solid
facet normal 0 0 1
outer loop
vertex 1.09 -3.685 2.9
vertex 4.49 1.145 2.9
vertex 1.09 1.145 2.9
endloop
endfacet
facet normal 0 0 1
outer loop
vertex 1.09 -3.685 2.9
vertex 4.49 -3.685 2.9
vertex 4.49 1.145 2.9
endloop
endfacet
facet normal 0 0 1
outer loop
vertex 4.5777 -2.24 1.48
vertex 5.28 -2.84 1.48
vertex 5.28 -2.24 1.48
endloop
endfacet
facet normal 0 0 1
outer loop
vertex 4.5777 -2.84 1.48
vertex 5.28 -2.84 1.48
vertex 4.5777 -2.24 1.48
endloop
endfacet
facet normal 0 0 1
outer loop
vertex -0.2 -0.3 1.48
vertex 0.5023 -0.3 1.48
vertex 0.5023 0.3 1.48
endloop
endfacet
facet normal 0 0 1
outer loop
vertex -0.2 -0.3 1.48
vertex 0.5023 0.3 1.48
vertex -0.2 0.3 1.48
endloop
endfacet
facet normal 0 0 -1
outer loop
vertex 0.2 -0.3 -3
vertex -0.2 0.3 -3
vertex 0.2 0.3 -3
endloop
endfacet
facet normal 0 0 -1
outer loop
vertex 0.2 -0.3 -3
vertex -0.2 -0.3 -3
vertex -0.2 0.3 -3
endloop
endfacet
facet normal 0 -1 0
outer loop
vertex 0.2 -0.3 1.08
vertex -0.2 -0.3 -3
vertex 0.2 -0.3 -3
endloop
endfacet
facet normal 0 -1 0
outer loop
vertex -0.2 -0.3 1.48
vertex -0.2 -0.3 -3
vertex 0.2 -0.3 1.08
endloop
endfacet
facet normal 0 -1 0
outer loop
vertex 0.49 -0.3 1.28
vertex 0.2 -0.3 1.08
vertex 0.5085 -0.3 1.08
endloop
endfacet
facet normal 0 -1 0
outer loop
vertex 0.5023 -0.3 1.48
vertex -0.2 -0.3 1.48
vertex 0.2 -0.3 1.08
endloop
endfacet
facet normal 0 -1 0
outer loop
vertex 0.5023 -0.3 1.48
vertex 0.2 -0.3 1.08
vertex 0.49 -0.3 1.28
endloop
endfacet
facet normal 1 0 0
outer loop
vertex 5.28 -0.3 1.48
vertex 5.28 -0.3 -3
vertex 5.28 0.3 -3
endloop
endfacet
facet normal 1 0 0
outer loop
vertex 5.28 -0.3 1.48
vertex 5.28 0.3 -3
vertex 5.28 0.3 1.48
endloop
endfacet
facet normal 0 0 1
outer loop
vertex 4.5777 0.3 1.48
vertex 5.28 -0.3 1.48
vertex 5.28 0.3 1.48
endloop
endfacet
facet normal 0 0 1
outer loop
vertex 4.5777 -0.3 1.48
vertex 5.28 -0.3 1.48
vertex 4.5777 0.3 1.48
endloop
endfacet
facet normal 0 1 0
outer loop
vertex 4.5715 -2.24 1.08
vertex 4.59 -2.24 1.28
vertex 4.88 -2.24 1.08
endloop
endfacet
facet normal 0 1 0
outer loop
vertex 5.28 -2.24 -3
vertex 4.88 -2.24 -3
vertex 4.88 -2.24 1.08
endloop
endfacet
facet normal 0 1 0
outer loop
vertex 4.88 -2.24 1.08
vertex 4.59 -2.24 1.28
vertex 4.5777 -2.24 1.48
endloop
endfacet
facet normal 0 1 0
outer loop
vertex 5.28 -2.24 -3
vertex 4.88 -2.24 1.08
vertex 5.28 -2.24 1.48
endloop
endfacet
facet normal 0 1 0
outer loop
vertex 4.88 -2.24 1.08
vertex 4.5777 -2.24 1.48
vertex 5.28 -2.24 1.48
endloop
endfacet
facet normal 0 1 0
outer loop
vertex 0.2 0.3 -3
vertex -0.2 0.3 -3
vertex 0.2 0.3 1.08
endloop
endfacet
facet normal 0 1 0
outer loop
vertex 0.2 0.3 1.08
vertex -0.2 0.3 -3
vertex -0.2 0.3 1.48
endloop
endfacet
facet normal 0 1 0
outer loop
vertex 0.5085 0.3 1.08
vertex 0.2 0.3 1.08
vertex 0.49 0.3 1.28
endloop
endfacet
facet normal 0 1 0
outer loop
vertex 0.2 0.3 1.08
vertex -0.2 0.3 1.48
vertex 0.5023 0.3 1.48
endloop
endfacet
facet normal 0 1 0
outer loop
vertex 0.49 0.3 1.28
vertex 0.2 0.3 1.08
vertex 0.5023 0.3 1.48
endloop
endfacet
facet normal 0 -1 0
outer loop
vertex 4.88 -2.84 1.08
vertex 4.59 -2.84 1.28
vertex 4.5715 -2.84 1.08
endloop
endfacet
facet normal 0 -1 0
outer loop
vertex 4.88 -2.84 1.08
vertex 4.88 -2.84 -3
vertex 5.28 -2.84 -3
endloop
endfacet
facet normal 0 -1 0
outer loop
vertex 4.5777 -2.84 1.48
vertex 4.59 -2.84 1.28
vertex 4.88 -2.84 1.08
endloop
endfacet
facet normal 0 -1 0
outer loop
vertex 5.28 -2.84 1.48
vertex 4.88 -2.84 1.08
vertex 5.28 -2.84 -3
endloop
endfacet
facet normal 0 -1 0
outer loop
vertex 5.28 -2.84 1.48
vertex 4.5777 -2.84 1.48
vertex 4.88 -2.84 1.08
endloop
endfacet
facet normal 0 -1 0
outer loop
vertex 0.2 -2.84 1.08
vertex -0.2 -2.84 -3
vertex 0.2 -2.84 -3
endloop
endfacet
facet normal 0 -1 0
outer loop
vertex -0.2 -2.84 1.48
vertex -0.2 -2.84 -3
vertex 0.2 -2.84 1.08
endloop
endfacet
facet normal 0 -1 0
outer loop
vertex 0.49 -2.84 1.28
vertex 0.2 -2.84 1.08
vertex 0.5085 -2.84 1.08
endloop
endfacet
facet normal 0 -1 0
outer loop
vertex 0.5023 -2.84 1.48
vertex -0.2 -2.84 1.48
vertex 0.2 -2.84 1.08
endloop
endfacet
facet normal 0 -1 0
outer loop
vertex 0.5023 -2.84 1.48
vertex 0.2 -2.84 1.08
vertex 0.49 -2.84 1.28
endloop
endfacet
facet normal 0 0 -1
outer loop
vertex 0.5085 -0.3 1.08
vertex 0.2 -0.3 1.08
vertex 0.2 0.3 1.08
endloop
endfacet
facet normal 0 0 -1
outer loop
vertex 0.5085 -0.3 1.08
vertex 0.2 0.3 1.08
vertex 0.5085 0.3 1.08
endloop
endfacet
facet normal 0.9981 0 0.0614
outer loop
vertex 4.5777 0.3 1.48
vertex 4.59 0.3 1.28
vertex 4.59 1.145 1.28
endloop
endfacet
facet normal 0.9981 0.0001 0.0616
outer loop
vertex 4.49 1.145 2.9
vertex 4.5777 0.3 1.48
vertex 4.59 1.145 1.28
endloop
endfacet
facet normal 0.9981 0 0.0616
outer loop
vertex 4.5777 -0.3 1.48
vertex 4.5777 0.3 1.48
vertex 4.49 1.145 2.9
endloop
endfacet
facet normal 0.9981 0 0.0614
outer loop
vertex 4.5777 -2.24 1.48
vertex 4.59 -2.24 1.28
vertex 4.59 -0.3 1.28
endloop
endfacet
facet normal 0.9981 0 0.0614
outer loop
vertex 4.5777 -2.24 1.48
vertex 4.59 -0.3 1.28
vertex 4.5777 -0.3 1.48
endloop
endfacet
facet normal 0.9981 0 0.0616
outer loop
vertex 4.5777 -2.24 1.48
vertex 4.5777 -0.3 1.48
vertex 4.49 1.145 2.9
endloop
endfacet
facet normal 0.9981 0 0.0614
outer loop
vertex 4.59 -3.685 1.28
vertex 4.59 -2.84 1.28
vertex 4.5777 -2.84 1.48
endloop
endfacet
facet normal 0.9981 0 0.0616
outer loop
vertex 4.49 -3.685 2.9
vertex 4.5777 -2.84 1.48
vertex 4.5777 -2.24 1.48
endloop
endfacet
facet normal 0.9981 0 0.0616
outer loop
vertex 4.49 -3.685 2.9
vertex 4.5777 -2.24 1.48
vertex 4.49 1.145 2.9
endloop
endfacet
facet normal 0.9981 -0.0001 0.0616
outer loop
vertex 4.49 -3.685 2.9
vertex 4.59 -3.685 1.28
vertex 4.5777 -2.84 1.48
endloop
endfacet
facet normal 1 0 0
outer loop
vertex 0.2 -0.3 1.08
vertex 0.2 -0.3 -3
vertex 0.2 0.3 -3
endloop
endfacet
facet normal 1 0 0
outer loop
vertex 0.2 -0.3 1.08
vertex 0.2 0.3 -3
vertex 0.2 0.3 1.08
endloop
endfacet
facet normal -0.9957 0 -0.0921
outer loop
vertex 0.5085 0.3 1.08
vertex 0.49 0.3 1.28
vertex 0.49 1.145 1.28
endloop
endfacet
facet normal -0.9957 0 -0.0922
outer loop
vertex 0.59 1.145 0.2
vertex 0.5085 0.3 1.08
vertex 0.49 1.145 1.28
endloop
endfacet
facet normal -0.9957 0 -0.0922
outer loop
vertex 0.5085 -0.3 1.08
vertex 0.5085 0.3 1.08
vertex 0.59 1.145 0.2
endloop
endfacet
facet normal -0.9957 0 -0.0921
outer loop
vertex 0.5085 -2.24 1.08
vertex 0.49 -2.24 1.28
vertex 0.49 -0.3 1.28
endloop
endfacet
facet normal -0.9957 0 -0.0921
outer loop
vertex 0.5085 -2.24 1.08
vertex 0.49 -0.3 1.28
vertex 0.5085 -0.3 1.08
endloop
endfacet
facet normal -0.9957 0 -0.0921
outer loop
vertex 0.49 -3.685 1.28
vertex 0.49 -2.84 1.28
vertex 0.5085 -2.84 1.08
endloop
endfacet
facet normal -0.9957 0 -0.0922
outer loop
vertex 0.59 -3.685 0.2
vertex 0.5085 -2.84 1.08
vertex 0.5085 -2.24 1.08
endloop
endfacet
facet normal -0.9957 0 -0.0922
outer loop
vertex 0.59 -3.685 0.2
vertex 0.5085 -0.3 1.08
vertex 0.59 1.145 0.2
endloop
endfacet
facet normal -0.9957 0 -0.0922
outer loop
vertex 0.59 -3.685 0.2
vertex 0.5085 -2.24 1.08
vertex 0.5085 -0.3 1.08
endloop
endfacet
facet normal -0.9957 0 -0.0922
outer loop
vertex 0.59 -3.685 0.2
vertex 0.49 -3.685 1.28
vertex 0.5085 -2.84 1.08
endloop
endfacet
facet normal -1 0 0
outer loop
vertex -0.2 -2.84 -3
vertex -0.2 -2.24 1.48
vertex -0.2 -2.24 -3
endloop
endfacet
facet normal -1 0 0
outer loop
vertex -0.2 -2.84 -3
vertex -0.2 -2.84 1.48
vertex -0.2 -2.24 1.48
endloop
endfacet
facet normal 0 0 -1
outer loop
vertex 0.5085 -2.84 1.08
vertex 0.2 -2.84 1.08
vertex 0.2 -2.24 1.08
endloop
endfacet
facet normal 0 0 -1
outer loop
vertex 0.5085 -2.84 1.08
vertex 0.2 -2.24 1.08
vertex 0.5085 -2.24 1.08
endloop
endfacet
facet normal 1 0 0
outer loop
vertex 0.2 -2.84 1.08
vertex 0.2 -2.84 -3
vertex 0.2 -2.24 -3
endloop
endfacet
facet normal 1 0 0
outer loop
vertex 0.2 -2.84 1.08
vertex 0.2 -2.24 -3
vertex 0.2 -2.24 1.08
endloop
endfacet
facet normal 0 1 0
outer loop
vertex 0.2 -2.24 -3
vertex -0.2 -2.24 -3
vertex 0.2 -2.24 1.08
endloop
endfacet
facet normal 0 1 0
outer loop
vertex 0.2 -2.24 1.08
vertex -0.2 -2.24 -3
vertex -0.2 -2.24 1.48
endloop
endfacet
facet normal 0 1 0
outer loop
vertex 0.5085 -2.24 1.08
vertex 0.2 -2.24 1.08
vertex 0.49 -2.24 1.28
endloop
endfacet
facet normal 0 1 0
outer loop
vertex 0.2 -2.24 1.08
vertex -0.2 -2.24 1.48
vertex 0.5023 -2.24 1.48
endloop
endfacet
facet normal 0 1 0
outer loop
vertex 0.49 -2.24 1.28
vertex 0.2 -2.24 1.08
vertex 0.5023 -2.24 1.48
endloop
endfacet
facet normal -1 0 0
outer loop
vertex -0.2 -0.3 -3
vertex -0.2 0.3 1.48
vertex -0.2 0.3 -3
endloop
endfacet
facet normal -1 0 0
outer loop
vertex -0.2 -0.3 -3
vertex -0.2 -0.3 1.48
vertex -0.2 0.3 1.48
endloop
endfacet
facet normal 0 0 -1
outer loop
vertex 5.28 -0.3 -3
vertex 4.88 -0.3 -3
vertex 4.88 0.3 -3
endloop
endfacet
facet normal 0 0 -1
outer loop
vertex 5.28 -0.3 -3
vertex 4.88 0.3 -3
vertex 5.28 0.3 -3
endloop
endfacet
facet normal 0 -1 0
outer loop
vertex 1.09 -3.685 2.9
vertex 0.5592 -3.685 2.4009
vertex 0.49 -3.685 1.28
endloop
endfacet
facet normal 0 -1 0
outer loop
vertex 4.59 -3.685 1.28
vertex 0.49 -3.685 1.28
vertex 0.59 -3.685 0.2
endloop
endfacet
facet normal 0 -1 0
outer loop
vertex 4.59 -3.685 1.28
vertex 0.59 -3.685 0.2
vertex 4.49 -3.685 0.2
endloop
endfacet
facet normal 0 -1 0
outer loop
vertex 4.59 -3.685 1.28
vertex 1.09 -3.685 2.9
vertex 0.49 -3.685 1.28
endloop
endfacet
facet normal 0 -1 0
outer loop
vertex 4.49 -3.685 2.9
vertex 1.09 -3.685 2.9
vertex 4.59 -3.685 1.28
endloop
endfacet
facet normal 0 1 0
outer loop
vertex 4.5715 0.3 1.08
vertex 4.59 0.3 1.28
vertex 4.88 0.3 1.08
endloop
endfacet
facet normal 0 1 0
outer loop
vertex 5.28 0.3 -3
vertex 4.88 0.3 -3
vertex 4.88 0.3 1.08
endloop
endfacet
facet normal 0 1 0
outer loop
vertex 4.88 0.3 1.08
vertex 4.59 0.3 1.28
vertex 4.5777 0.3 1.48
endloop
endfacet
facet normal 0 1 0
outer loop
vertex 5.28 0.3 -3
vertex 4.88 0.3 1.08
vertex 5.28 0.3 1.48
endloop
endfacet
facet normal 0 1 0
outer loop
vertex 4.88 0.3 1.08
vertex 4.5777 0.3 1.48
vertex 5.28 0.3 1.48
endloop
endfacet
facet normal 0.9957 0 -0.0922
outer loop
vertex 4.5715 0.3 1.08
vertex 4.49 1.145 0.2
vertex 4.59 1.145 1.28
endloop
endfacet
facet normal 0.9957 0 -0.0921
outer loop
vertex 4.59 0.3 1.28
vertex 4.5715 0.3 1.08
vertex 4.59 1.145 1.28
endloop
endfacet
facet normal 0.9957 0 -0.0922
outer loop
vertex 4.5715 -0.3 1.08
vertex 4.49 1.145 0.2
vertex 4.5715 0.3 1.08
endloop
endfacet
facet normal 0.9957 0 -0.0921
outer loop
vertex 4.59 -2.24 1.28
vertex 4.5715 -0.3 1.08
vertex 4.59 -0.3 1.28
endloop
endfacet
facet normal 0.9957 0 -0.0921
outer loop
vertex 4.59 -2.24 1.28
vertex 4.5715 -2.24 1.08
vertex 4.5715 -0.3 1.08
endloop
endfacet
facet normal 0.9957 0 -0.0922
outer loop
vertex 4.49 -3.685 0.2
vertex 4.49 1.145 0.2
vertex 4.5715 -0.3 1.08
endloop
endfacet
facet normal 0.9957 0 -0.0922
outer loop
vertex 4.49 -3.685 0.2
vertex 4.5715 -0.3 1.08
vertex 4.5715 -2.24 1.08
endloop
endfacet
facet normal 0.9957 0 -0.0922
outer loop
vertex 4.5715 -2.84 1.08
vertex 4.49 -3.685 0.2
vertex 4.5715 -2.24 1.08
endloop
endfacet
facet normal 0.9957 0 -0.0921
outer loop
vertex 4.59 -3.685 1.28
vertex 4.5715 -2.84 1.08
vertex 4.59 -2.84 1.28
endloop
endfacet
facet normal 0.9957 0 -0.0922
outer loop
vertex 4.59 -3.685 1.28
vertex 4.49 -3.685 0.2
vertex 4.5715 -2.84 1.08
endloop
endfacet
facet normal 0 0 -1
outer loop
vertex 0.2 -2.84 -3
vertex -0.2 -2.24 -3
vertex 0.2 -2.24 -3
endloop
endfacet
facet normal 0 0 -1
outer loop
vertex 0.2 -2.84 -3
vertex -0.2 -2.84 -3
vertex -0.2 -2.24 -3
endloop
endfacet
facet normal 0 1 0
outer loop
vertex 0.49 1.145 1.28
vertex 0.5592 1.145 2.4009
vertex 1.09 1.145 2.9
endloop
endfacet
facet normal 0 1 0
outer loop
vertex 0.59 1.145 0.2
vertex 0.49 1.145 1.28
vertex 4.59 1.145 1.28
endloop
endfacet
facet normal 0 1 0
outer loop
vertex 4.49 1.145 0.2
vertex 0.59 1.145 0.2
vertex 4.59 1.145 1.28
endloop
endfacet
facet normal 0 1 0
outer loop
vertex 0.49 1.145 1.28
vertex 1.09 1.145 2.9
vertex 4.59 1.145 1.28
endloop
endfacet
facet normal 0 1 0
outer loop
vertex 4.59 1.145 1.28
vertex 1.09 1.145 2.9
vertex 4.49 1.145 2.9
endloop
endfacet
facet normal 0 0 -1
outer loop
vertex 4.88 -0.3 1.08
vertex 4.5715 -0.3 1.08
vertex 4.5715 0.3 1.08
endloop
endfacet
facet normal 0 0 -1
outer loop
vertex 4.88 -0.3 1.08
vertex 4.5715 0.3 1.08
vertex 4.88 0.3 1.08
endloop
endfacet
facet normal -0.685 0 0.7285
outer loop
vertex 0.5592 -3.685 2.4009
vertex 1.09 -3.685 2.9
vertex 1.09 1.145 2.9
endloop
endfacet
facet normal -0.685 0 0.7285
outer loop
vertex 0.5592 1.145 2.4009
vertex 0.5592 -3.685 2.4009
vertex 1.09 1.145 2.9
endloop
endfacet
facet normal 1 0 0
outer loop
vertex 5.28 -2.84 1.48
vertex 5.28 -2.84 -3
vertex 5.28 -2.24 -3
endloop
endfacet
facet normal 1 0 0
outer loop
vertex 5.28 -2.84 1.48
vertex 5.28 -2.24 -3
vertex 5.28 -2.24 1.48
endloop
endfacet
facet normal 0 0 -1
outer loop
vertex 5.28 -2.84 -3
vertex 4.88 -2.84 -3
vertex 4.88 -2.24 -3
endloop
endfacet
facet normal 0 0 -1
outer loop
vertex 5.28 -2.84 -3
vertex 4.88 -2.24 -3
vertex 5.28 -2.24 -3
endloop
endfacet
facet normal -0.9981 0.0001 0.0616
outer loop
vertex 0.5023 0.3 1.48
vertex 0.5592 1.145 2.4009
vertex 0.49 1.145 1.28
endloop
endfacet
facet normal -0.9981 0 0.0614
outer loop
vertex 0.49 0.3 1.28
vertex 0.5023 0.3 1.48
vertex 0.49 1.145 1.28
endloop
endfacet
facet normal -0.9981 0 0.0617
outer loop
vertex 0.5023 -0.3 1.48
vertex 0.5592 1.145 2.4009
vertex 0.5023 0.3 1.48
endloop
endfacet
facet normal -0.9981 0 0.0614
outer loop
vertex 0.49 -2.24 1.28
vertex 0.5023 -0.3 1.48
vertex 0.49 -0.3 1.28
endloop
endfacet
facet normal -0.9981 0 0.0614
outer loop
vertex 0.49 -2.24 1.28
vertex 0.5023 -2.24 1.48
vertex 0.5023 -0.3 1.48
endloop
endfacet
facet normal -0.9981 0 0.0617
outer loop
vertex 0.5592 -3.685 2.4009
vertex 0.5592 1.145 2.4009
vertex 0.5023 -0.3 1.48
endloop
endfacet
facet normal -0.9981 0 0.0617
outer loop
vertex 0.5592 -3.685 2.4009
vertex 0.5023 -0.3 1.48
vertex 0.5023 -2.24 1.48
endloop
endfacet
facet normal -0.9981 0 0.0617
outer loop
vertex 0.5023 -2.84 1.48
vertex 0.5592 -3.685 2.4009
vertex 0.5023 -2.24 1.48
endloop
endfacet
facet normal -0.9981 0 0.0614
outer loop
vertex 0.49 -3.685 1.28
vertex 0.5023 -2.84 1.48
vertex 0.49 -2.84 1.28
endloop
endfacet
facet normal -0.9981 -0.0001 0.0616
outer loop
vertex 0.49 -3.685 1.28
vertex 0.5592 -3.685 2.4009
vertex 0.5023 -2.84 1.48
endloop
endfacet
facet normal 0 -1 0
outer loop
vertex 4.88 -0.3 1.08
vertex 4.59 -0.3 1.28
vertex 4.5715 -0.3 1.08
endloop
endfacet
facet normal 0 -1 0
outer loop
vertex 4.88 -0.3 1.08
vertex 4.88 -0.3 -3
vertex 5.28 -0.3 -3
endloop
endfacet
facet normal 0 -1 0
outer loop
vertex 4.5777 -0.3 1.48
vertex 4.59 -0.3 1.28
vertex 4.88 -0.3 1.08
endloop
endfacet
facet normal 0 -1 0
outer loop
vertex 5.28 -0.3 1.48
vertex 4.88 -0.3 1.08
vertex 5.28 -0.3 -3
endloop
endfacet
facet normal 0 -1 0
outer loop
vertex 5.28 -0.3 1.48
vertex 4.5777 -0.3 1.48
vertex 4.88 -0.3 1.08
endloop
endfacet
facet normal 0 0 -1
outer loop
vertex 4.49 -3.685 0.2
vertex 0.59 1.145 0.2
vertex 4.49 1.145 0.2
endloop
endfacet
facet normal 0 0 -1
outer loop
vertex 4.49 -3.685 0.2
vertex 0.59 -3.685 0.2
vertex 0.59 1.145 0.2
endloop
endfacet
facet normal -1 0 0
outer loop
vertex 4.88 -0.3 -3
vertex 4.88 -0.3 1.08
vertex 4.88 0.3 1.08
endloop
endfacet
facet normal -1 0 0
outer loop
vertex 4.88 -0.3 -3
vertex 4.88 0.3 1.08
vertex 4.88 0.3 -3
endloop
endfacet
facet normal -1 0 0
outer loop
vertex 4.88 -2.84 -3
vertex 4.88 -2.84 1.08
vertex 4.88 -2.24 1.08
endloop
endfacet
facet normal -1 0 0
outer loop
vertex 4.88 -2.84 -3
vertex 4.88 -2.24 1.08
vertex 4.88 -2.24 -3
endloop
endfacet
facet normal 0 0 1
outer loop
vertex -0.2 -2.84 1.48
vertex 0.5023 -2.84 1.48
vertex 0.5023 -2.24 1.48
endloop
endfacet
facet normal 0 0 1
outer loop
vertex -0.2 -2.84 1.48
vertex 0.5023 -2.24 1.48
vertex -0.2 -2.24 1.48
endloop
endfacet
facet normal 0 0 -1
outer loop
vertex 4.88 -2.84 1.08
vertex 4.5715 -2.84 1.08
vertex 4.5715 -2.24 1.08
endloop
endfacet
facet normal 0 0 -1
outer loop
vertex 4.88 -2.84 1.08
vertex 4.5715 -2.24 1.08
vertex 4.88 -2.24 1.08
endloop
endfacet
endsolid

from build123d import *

# Parameters (mm, degrees)
PAD002_DEPTH = 0.3
PAD_DEPTH    = 2.415
CHAMFER_SIZE = 0.5
PAD001_DEPTH = 0.3


with BuildPart() as pad002:
    # Sketch002 → Pad002 (new body, symmetric)
    with BuildSketch(Plane.XZ.offset(2.54)):
        Polygon((-0.2, -3), (0.2, -3), (0.2, 1.08), (4.88, 1.08), (4.88, -3), (5.28, -3), (5.28, 1.48), (-0.2, 1.48), align=None)
    extrude(amount=PAD002_DEPTH, both=True)


with BuildPart() as chamfer_body:
    # Sketch → Pad (new body, symmetric)
    with BuildSketch(Plane.XZ.offset(1.27)):
        Polygon((0.59, 0.2), (4.49, 0.2), (4.59, 1.28), (4.49, 2.9), (0.59, 2.9), (0.49, 1.28), align=None)
    extrude(amount=PAD_DEPTH, both=True)

    # Chamfer
    chamfer_edges = [chamfer_body.edges().sort_by_distance(p)[0] for p in [
        (0.59, -1.27, 2.9),
    ]]
    chamfer(chamfer_edges, length=CHAMFER_SIZE)


with BuildPart() as diode_bridge_dip_4_w5_08mm_p2_54mm:
    # Sketch001 → Pad001 (new body, symmetric)
    with BuildSketch(Plane.XZ):
        Polygon((-0.2, -3), (0.2, -3), (0.2, 1.08), (4.88, 1.08), (4.88, -3), (5.28, -3), (5.28, 1.48), (-0.2, 1.48), align=None)
    extrude(amount=PAD001_DEPTH, both=True)

    # Pad001_mp_cp: union Pad002, Chamfer body
    add(pad002.part)
    add(chamfer_body.part)


solid = diode_bridge_dip_4_w5_08mm_p2_54mm.part
